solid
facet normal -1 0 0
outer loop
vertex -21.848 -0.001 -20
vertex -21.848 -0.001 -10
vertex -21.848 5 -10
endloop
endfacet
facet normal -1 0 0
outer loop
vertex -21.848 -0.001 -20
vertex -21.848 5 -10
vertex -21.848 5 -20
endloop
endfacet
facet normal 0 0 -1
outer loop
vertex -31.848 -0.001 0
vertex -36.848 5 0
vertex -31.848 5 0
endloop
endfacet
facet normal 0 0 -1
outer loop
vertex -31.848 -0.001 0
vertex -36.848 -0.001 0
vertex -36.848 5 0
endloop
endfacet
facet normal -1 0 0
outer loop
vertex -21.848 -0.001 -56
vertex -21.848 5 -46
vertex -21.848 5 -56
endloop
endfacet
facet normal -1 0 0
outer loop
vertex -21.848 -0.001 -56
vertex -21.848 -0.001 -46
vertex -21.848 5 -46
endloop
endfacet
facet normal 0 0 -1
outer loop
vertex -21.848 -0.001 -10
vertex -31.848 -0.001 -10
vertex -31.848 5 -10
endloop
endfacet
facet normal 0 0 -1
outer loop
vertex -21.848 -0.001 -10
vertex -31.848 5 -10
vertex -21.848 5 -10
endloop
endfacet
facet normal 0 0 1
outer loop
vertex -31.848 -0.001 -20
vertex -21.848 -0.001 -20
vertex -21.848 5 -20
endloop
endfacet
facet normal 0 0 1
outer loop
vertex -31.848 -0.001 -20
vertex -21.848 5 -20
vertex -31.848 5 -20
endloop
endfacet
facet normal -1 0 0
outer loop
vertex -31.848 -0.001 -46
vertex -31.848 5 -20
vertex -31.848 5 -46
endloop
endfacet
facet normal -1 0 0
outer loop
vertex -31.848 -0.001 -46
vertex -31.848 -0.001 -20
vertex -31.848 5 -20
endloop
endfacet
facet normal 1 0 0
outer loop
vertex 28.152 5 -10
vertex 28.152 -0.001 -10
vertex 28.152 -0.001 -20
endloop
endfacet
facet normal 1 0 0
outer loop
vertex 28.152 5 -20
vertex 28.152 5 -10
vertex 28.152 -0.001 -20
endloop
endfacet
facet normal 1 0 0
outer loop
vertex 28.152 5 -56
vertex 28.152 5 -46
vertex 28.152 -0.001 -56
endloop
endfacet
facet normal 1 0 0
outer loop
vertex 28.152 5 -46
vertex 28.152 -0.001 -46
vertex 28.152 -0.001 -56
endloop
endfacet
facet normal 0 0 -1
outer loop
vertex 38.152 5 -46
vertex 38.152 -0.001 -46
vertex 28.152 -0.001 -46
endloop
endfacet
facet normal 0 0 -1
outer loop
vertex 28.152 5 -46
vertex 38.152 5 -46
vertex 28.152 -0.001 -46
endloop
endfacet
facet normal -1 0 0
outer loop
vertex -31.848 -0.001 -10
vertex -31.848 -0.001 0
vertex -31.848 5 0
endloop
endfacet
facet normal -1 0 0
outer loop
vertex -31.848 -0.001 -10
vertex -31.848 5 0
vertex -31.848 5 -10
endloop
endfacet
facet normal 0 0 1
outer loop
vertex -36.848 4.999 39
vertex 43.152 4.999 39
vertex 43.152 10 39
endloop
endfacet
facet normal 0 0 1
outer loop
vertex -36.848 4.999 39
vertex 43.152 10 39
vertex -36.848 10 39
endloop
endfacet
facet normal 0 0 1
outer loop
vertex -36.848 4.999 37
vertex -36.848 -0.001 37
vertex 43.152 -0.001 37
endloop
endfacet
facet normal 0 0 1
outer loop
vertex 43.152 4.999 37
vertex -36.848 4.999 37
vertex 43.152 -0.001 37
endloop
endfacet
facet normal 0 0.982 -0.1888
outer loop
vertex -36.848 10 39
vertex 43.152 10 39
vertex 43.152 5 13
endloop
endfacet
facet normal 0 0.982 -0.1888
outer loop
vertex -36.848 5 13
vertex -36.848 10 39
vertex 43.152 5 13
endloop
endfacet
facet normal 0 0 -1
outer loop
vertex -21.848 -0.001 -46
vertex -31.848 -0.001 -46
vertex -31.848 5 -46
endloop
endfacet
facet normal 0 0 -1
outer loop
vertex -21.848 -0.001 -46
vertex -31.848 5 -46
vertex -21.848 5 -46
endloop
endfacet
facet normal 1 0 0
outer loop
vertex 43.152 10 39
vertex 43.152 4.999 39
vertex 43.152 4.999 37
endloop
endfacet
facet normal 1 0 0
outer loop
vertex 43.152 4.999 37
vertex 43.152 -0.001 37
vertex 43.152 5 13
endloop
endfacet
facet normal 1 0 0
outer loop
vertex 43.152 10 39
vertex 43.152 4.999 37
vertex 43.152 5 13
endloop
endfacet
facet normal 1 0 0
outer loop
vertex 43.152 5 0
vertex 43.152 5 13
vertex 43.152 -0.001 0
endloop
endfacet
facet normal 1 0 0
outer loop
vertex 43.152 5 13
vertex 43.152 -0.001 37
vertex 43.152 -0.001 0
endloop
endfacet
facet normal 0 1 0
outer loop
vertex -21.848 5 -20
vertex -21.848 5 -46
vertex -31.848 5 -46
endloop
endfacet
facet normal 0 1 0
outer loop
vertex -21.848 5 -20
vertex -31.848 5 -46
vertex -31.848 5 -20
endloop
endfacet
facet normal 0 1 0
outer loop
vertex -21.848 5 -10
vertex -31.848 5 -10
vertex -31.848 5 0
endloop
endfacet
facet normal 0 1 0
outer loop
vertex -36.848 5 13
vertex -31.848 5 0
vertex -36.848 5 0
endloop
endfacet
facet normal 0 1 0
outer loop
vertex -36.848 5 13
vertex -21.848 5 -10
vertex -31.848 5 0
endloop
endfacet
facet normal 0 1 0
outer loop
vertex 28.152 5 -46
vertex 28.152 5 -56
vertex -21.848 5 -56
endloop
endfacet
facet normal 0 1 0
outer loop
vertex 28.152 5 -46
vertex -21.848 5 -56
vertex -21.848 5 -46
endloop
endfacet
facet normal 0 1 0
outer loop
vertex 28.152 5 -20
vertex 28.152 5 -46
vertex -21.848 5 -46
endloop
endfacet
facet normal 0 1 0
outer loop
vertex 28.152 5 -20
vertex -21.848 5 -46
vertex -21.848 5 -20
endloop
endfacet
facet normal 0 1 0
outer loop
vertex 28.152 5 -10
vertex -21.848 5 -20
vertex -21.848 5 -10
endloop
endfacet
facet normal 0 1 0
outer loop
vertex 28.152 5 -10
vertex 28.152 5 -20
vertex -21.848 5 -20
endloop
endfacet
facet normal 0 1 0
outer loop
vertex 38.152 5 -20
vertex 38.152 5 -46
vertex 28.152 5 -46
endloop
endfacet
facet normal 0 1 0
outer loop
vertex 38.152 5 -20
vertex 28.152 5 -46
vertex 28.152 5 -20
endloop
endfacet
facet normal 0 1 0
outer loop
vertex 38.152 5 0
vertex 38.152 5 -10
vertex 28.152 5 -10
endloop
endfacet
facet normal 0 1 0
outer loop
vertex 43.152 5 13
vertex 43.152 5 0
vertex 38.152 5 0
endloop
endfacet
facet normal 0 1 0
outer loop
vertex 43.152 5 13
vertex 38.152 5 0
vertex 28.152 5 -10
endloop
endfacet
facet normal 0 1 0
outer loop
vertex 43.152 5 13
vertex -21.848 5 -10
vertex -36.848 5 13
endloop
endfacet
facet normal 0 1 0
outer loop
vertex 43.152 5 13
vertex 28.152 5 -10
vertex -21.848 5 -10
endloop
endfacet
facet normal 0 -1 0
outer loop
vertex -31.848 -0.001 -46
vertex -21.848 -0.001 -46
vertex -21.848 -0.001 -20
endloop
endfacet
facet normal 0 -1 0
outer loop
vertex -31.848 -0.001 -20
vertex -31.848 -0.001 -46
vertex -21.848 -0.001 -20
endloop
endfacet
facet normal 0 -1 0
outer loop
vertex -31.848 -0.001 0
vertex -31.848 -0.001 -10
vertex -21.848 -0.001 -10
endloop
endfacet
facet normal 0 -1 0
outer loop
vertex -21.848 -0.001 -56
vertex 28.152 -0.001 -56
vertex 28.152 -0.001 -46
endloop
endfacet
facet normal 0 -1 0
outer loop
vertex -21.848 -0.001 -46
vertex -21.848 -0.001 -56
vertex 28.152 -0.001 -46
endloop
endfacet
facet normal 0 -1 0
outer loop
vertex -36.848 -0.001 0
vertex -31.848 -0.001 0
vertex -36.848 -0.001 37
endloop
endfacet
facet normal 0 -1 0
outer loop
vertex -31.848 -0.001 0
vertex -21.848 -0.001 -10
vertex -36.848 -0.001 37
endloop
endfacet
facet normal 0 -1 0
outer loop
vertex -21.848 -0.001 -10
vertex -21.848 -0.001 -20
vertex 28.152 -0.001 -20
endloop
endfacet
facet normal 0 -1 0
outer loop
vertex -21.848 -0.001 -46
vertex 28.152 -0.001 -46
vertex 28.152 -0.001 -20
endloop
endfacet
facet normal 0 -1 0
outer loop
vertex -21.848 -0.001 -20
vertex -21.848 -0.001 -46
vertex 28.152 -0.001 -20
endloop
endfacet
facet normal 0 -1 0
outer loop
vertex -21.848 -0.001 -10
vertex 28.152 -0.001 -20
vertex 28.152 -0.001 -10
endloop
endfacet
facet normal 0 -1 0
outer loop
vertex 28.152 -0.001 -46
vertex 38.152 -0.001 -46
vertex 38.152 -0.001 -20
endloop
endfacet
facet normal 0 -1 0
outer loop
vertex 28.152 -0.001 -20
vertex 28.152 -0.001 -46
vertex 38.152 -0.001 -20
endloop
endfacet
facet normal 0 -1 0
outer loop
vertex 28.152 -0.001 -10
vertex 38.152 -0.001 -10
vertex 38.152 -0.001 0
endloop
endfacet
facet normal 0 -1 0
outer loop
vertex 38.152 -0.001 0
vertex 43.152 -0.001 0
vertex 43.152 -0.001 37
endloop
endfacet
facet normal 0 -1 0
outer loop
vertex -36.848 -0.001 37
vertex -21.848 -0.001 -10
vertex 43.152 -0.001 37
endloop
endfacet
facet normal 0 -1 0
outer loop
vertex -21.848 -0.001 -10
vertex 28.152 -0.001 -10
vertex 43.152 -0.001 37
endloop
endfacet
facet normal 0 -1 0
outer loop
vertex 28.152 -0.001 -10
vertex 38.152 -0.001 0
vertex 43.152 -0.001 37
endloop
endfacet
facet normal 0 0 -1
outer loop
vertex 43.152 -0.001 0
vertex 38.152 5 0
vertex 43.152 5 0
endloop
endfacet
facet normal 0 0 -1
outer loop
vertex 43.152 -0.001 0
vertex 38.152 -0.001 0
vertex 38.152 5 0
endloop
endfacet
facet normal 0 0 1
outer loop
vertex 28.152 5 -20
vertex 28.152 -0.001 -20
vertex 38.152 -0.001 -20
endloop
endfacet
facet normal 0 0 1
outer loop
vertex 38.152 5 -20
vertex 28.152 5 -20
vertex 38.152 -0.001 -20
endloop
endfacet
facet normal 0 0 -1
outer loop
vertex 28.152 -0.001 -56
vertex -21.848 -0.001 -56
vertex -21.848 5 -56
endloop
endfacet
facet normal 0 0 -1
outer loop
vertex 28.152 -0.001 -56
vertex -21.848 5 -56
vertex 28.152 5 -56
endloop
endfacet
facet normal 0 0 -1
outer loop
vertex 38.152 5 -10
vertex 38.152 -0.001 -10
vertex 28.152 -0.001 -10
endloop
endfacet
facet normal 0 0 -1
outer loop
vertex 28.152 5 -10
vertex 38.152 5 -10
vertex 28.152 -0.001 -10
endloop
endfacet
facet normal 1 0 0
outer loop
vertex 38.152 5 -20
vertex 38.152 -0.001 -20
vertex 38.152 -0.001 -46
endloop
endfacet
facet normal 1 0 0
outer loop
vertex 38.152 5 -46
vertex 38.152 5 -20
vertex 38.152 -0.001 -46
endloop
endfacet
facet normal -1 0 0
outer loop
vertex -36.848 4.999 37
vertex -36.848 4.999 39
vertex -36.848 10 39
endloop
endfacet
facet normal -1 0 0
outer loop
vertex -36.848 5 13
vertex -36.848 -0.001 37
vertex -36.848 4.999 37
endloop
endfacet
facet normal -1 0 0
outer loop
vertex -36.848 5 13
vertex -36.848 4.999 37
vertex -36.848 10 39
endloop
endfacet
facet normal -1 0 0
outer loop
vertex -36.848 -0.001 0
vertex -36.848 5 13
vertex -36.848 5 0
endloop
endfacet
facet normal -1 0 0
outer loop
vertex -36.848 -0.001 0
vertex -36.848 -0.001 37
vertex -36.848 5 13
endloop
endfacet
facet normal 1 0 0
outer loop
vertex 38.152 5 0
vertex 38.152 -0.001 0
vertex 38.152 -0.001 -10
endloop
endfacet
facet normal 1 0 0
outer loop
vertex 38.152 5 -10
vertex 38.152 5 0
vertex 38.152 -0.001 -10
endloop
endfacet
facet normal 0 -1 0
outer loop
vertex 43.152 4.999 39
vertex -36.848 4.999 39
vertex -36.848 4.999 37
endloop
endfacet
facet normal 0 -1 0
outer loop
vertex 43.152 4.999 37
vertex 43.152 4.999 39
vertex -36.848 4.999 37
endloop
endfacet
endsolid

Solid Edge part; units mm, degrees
sketch "Sketch1" plane through (0, 0, 0) normal (0, -1, 0) x (1, 0, 0)
  line L0 (38.1517, 0) -> (38.1517, -10)
  line L1 (38.1517, -10) -> (28.1517, -10)
  line L2 (28.1517, -10) -> (28.1517, -20)
  line L3 (28.1517, -20) -> (38.1517, -20)
  line L4 (38.1517, -20) -> (38.1517, -46)
  line L5 (38.1517, -46) -> (28.1517, -46)
  line L6 (28.1517, -46) -> (28.1517, -56)
  line L7 (-21.8483, -56) -> (28.1517, -56)
  line L8 (-21.8483, -46) -> (-21.8483, -56)
  line L9 (-31.8483, -46) -> (-21.8483, -46)
  line L10 (-31.8483, -20) -> (-31.8483, -46)
  line L11 (-21.8483, -20) -> (-31.8483, -20)
  line L12 (-21.8483, -10) -> (-21.8483, -20)
  line L13 (-31.8483, -10) -> (-21.8483, -10)
  line L14 (-31.8483, 0) -> (-31.8483, -10)
  line L15 (-36.8483, 0) -> (-31.8483, 0)
  line L16 (-36.8483, 37) -> (-36.8483, 0)
  line L17 (-36.8483, 37) -> (43.1517, 37)
  line L18 (43.1517, 37) -> (43.1517, 0)
  line L19 (38.1517, 0) -> (43.1517, 0)
extrude "Extrusionsausprägung_1" add sketch "Sketch1" against normal blind 5 and the other way blind 0.001
sketch "Sketch2" plane through (3.1517, 5, -9.5) normal (0, 1, 0) x (0, 0, -1)
  line L0 (-46.5, 40) -> (-22.5, 40)
  line L1 (-22.5, 40) -> (-22.5, -40)
  line L2 (-22.5, -40) -> (-48.5, -40)
  line L3 (-48.5, -40) -> (-48.5, 40)
  line L4 (-48.5, 40) -> (-46.5, 40)
extrude "Extrusionsausprägung_2" add sketch "Sketch2" along normal blind 5 and the other way blind 0.001
sketch "Sketch3" plane through (43.1517, 4.9995, 19.5) normal (1, 0, 0) x (0, 0, -1)
  line L0 (-19.5, 5.0005) -> (6.5, 0.0005)
  line L1 (6.5, 0.0005) -> (9.9801, 7.8832)
  line L2 (9.9801, 7.8832) -> (-19.5, 5.0005)
extrude "Extrusionsausschnitt_1" cut sketch "Sketch3" against normal blind 96.3179
